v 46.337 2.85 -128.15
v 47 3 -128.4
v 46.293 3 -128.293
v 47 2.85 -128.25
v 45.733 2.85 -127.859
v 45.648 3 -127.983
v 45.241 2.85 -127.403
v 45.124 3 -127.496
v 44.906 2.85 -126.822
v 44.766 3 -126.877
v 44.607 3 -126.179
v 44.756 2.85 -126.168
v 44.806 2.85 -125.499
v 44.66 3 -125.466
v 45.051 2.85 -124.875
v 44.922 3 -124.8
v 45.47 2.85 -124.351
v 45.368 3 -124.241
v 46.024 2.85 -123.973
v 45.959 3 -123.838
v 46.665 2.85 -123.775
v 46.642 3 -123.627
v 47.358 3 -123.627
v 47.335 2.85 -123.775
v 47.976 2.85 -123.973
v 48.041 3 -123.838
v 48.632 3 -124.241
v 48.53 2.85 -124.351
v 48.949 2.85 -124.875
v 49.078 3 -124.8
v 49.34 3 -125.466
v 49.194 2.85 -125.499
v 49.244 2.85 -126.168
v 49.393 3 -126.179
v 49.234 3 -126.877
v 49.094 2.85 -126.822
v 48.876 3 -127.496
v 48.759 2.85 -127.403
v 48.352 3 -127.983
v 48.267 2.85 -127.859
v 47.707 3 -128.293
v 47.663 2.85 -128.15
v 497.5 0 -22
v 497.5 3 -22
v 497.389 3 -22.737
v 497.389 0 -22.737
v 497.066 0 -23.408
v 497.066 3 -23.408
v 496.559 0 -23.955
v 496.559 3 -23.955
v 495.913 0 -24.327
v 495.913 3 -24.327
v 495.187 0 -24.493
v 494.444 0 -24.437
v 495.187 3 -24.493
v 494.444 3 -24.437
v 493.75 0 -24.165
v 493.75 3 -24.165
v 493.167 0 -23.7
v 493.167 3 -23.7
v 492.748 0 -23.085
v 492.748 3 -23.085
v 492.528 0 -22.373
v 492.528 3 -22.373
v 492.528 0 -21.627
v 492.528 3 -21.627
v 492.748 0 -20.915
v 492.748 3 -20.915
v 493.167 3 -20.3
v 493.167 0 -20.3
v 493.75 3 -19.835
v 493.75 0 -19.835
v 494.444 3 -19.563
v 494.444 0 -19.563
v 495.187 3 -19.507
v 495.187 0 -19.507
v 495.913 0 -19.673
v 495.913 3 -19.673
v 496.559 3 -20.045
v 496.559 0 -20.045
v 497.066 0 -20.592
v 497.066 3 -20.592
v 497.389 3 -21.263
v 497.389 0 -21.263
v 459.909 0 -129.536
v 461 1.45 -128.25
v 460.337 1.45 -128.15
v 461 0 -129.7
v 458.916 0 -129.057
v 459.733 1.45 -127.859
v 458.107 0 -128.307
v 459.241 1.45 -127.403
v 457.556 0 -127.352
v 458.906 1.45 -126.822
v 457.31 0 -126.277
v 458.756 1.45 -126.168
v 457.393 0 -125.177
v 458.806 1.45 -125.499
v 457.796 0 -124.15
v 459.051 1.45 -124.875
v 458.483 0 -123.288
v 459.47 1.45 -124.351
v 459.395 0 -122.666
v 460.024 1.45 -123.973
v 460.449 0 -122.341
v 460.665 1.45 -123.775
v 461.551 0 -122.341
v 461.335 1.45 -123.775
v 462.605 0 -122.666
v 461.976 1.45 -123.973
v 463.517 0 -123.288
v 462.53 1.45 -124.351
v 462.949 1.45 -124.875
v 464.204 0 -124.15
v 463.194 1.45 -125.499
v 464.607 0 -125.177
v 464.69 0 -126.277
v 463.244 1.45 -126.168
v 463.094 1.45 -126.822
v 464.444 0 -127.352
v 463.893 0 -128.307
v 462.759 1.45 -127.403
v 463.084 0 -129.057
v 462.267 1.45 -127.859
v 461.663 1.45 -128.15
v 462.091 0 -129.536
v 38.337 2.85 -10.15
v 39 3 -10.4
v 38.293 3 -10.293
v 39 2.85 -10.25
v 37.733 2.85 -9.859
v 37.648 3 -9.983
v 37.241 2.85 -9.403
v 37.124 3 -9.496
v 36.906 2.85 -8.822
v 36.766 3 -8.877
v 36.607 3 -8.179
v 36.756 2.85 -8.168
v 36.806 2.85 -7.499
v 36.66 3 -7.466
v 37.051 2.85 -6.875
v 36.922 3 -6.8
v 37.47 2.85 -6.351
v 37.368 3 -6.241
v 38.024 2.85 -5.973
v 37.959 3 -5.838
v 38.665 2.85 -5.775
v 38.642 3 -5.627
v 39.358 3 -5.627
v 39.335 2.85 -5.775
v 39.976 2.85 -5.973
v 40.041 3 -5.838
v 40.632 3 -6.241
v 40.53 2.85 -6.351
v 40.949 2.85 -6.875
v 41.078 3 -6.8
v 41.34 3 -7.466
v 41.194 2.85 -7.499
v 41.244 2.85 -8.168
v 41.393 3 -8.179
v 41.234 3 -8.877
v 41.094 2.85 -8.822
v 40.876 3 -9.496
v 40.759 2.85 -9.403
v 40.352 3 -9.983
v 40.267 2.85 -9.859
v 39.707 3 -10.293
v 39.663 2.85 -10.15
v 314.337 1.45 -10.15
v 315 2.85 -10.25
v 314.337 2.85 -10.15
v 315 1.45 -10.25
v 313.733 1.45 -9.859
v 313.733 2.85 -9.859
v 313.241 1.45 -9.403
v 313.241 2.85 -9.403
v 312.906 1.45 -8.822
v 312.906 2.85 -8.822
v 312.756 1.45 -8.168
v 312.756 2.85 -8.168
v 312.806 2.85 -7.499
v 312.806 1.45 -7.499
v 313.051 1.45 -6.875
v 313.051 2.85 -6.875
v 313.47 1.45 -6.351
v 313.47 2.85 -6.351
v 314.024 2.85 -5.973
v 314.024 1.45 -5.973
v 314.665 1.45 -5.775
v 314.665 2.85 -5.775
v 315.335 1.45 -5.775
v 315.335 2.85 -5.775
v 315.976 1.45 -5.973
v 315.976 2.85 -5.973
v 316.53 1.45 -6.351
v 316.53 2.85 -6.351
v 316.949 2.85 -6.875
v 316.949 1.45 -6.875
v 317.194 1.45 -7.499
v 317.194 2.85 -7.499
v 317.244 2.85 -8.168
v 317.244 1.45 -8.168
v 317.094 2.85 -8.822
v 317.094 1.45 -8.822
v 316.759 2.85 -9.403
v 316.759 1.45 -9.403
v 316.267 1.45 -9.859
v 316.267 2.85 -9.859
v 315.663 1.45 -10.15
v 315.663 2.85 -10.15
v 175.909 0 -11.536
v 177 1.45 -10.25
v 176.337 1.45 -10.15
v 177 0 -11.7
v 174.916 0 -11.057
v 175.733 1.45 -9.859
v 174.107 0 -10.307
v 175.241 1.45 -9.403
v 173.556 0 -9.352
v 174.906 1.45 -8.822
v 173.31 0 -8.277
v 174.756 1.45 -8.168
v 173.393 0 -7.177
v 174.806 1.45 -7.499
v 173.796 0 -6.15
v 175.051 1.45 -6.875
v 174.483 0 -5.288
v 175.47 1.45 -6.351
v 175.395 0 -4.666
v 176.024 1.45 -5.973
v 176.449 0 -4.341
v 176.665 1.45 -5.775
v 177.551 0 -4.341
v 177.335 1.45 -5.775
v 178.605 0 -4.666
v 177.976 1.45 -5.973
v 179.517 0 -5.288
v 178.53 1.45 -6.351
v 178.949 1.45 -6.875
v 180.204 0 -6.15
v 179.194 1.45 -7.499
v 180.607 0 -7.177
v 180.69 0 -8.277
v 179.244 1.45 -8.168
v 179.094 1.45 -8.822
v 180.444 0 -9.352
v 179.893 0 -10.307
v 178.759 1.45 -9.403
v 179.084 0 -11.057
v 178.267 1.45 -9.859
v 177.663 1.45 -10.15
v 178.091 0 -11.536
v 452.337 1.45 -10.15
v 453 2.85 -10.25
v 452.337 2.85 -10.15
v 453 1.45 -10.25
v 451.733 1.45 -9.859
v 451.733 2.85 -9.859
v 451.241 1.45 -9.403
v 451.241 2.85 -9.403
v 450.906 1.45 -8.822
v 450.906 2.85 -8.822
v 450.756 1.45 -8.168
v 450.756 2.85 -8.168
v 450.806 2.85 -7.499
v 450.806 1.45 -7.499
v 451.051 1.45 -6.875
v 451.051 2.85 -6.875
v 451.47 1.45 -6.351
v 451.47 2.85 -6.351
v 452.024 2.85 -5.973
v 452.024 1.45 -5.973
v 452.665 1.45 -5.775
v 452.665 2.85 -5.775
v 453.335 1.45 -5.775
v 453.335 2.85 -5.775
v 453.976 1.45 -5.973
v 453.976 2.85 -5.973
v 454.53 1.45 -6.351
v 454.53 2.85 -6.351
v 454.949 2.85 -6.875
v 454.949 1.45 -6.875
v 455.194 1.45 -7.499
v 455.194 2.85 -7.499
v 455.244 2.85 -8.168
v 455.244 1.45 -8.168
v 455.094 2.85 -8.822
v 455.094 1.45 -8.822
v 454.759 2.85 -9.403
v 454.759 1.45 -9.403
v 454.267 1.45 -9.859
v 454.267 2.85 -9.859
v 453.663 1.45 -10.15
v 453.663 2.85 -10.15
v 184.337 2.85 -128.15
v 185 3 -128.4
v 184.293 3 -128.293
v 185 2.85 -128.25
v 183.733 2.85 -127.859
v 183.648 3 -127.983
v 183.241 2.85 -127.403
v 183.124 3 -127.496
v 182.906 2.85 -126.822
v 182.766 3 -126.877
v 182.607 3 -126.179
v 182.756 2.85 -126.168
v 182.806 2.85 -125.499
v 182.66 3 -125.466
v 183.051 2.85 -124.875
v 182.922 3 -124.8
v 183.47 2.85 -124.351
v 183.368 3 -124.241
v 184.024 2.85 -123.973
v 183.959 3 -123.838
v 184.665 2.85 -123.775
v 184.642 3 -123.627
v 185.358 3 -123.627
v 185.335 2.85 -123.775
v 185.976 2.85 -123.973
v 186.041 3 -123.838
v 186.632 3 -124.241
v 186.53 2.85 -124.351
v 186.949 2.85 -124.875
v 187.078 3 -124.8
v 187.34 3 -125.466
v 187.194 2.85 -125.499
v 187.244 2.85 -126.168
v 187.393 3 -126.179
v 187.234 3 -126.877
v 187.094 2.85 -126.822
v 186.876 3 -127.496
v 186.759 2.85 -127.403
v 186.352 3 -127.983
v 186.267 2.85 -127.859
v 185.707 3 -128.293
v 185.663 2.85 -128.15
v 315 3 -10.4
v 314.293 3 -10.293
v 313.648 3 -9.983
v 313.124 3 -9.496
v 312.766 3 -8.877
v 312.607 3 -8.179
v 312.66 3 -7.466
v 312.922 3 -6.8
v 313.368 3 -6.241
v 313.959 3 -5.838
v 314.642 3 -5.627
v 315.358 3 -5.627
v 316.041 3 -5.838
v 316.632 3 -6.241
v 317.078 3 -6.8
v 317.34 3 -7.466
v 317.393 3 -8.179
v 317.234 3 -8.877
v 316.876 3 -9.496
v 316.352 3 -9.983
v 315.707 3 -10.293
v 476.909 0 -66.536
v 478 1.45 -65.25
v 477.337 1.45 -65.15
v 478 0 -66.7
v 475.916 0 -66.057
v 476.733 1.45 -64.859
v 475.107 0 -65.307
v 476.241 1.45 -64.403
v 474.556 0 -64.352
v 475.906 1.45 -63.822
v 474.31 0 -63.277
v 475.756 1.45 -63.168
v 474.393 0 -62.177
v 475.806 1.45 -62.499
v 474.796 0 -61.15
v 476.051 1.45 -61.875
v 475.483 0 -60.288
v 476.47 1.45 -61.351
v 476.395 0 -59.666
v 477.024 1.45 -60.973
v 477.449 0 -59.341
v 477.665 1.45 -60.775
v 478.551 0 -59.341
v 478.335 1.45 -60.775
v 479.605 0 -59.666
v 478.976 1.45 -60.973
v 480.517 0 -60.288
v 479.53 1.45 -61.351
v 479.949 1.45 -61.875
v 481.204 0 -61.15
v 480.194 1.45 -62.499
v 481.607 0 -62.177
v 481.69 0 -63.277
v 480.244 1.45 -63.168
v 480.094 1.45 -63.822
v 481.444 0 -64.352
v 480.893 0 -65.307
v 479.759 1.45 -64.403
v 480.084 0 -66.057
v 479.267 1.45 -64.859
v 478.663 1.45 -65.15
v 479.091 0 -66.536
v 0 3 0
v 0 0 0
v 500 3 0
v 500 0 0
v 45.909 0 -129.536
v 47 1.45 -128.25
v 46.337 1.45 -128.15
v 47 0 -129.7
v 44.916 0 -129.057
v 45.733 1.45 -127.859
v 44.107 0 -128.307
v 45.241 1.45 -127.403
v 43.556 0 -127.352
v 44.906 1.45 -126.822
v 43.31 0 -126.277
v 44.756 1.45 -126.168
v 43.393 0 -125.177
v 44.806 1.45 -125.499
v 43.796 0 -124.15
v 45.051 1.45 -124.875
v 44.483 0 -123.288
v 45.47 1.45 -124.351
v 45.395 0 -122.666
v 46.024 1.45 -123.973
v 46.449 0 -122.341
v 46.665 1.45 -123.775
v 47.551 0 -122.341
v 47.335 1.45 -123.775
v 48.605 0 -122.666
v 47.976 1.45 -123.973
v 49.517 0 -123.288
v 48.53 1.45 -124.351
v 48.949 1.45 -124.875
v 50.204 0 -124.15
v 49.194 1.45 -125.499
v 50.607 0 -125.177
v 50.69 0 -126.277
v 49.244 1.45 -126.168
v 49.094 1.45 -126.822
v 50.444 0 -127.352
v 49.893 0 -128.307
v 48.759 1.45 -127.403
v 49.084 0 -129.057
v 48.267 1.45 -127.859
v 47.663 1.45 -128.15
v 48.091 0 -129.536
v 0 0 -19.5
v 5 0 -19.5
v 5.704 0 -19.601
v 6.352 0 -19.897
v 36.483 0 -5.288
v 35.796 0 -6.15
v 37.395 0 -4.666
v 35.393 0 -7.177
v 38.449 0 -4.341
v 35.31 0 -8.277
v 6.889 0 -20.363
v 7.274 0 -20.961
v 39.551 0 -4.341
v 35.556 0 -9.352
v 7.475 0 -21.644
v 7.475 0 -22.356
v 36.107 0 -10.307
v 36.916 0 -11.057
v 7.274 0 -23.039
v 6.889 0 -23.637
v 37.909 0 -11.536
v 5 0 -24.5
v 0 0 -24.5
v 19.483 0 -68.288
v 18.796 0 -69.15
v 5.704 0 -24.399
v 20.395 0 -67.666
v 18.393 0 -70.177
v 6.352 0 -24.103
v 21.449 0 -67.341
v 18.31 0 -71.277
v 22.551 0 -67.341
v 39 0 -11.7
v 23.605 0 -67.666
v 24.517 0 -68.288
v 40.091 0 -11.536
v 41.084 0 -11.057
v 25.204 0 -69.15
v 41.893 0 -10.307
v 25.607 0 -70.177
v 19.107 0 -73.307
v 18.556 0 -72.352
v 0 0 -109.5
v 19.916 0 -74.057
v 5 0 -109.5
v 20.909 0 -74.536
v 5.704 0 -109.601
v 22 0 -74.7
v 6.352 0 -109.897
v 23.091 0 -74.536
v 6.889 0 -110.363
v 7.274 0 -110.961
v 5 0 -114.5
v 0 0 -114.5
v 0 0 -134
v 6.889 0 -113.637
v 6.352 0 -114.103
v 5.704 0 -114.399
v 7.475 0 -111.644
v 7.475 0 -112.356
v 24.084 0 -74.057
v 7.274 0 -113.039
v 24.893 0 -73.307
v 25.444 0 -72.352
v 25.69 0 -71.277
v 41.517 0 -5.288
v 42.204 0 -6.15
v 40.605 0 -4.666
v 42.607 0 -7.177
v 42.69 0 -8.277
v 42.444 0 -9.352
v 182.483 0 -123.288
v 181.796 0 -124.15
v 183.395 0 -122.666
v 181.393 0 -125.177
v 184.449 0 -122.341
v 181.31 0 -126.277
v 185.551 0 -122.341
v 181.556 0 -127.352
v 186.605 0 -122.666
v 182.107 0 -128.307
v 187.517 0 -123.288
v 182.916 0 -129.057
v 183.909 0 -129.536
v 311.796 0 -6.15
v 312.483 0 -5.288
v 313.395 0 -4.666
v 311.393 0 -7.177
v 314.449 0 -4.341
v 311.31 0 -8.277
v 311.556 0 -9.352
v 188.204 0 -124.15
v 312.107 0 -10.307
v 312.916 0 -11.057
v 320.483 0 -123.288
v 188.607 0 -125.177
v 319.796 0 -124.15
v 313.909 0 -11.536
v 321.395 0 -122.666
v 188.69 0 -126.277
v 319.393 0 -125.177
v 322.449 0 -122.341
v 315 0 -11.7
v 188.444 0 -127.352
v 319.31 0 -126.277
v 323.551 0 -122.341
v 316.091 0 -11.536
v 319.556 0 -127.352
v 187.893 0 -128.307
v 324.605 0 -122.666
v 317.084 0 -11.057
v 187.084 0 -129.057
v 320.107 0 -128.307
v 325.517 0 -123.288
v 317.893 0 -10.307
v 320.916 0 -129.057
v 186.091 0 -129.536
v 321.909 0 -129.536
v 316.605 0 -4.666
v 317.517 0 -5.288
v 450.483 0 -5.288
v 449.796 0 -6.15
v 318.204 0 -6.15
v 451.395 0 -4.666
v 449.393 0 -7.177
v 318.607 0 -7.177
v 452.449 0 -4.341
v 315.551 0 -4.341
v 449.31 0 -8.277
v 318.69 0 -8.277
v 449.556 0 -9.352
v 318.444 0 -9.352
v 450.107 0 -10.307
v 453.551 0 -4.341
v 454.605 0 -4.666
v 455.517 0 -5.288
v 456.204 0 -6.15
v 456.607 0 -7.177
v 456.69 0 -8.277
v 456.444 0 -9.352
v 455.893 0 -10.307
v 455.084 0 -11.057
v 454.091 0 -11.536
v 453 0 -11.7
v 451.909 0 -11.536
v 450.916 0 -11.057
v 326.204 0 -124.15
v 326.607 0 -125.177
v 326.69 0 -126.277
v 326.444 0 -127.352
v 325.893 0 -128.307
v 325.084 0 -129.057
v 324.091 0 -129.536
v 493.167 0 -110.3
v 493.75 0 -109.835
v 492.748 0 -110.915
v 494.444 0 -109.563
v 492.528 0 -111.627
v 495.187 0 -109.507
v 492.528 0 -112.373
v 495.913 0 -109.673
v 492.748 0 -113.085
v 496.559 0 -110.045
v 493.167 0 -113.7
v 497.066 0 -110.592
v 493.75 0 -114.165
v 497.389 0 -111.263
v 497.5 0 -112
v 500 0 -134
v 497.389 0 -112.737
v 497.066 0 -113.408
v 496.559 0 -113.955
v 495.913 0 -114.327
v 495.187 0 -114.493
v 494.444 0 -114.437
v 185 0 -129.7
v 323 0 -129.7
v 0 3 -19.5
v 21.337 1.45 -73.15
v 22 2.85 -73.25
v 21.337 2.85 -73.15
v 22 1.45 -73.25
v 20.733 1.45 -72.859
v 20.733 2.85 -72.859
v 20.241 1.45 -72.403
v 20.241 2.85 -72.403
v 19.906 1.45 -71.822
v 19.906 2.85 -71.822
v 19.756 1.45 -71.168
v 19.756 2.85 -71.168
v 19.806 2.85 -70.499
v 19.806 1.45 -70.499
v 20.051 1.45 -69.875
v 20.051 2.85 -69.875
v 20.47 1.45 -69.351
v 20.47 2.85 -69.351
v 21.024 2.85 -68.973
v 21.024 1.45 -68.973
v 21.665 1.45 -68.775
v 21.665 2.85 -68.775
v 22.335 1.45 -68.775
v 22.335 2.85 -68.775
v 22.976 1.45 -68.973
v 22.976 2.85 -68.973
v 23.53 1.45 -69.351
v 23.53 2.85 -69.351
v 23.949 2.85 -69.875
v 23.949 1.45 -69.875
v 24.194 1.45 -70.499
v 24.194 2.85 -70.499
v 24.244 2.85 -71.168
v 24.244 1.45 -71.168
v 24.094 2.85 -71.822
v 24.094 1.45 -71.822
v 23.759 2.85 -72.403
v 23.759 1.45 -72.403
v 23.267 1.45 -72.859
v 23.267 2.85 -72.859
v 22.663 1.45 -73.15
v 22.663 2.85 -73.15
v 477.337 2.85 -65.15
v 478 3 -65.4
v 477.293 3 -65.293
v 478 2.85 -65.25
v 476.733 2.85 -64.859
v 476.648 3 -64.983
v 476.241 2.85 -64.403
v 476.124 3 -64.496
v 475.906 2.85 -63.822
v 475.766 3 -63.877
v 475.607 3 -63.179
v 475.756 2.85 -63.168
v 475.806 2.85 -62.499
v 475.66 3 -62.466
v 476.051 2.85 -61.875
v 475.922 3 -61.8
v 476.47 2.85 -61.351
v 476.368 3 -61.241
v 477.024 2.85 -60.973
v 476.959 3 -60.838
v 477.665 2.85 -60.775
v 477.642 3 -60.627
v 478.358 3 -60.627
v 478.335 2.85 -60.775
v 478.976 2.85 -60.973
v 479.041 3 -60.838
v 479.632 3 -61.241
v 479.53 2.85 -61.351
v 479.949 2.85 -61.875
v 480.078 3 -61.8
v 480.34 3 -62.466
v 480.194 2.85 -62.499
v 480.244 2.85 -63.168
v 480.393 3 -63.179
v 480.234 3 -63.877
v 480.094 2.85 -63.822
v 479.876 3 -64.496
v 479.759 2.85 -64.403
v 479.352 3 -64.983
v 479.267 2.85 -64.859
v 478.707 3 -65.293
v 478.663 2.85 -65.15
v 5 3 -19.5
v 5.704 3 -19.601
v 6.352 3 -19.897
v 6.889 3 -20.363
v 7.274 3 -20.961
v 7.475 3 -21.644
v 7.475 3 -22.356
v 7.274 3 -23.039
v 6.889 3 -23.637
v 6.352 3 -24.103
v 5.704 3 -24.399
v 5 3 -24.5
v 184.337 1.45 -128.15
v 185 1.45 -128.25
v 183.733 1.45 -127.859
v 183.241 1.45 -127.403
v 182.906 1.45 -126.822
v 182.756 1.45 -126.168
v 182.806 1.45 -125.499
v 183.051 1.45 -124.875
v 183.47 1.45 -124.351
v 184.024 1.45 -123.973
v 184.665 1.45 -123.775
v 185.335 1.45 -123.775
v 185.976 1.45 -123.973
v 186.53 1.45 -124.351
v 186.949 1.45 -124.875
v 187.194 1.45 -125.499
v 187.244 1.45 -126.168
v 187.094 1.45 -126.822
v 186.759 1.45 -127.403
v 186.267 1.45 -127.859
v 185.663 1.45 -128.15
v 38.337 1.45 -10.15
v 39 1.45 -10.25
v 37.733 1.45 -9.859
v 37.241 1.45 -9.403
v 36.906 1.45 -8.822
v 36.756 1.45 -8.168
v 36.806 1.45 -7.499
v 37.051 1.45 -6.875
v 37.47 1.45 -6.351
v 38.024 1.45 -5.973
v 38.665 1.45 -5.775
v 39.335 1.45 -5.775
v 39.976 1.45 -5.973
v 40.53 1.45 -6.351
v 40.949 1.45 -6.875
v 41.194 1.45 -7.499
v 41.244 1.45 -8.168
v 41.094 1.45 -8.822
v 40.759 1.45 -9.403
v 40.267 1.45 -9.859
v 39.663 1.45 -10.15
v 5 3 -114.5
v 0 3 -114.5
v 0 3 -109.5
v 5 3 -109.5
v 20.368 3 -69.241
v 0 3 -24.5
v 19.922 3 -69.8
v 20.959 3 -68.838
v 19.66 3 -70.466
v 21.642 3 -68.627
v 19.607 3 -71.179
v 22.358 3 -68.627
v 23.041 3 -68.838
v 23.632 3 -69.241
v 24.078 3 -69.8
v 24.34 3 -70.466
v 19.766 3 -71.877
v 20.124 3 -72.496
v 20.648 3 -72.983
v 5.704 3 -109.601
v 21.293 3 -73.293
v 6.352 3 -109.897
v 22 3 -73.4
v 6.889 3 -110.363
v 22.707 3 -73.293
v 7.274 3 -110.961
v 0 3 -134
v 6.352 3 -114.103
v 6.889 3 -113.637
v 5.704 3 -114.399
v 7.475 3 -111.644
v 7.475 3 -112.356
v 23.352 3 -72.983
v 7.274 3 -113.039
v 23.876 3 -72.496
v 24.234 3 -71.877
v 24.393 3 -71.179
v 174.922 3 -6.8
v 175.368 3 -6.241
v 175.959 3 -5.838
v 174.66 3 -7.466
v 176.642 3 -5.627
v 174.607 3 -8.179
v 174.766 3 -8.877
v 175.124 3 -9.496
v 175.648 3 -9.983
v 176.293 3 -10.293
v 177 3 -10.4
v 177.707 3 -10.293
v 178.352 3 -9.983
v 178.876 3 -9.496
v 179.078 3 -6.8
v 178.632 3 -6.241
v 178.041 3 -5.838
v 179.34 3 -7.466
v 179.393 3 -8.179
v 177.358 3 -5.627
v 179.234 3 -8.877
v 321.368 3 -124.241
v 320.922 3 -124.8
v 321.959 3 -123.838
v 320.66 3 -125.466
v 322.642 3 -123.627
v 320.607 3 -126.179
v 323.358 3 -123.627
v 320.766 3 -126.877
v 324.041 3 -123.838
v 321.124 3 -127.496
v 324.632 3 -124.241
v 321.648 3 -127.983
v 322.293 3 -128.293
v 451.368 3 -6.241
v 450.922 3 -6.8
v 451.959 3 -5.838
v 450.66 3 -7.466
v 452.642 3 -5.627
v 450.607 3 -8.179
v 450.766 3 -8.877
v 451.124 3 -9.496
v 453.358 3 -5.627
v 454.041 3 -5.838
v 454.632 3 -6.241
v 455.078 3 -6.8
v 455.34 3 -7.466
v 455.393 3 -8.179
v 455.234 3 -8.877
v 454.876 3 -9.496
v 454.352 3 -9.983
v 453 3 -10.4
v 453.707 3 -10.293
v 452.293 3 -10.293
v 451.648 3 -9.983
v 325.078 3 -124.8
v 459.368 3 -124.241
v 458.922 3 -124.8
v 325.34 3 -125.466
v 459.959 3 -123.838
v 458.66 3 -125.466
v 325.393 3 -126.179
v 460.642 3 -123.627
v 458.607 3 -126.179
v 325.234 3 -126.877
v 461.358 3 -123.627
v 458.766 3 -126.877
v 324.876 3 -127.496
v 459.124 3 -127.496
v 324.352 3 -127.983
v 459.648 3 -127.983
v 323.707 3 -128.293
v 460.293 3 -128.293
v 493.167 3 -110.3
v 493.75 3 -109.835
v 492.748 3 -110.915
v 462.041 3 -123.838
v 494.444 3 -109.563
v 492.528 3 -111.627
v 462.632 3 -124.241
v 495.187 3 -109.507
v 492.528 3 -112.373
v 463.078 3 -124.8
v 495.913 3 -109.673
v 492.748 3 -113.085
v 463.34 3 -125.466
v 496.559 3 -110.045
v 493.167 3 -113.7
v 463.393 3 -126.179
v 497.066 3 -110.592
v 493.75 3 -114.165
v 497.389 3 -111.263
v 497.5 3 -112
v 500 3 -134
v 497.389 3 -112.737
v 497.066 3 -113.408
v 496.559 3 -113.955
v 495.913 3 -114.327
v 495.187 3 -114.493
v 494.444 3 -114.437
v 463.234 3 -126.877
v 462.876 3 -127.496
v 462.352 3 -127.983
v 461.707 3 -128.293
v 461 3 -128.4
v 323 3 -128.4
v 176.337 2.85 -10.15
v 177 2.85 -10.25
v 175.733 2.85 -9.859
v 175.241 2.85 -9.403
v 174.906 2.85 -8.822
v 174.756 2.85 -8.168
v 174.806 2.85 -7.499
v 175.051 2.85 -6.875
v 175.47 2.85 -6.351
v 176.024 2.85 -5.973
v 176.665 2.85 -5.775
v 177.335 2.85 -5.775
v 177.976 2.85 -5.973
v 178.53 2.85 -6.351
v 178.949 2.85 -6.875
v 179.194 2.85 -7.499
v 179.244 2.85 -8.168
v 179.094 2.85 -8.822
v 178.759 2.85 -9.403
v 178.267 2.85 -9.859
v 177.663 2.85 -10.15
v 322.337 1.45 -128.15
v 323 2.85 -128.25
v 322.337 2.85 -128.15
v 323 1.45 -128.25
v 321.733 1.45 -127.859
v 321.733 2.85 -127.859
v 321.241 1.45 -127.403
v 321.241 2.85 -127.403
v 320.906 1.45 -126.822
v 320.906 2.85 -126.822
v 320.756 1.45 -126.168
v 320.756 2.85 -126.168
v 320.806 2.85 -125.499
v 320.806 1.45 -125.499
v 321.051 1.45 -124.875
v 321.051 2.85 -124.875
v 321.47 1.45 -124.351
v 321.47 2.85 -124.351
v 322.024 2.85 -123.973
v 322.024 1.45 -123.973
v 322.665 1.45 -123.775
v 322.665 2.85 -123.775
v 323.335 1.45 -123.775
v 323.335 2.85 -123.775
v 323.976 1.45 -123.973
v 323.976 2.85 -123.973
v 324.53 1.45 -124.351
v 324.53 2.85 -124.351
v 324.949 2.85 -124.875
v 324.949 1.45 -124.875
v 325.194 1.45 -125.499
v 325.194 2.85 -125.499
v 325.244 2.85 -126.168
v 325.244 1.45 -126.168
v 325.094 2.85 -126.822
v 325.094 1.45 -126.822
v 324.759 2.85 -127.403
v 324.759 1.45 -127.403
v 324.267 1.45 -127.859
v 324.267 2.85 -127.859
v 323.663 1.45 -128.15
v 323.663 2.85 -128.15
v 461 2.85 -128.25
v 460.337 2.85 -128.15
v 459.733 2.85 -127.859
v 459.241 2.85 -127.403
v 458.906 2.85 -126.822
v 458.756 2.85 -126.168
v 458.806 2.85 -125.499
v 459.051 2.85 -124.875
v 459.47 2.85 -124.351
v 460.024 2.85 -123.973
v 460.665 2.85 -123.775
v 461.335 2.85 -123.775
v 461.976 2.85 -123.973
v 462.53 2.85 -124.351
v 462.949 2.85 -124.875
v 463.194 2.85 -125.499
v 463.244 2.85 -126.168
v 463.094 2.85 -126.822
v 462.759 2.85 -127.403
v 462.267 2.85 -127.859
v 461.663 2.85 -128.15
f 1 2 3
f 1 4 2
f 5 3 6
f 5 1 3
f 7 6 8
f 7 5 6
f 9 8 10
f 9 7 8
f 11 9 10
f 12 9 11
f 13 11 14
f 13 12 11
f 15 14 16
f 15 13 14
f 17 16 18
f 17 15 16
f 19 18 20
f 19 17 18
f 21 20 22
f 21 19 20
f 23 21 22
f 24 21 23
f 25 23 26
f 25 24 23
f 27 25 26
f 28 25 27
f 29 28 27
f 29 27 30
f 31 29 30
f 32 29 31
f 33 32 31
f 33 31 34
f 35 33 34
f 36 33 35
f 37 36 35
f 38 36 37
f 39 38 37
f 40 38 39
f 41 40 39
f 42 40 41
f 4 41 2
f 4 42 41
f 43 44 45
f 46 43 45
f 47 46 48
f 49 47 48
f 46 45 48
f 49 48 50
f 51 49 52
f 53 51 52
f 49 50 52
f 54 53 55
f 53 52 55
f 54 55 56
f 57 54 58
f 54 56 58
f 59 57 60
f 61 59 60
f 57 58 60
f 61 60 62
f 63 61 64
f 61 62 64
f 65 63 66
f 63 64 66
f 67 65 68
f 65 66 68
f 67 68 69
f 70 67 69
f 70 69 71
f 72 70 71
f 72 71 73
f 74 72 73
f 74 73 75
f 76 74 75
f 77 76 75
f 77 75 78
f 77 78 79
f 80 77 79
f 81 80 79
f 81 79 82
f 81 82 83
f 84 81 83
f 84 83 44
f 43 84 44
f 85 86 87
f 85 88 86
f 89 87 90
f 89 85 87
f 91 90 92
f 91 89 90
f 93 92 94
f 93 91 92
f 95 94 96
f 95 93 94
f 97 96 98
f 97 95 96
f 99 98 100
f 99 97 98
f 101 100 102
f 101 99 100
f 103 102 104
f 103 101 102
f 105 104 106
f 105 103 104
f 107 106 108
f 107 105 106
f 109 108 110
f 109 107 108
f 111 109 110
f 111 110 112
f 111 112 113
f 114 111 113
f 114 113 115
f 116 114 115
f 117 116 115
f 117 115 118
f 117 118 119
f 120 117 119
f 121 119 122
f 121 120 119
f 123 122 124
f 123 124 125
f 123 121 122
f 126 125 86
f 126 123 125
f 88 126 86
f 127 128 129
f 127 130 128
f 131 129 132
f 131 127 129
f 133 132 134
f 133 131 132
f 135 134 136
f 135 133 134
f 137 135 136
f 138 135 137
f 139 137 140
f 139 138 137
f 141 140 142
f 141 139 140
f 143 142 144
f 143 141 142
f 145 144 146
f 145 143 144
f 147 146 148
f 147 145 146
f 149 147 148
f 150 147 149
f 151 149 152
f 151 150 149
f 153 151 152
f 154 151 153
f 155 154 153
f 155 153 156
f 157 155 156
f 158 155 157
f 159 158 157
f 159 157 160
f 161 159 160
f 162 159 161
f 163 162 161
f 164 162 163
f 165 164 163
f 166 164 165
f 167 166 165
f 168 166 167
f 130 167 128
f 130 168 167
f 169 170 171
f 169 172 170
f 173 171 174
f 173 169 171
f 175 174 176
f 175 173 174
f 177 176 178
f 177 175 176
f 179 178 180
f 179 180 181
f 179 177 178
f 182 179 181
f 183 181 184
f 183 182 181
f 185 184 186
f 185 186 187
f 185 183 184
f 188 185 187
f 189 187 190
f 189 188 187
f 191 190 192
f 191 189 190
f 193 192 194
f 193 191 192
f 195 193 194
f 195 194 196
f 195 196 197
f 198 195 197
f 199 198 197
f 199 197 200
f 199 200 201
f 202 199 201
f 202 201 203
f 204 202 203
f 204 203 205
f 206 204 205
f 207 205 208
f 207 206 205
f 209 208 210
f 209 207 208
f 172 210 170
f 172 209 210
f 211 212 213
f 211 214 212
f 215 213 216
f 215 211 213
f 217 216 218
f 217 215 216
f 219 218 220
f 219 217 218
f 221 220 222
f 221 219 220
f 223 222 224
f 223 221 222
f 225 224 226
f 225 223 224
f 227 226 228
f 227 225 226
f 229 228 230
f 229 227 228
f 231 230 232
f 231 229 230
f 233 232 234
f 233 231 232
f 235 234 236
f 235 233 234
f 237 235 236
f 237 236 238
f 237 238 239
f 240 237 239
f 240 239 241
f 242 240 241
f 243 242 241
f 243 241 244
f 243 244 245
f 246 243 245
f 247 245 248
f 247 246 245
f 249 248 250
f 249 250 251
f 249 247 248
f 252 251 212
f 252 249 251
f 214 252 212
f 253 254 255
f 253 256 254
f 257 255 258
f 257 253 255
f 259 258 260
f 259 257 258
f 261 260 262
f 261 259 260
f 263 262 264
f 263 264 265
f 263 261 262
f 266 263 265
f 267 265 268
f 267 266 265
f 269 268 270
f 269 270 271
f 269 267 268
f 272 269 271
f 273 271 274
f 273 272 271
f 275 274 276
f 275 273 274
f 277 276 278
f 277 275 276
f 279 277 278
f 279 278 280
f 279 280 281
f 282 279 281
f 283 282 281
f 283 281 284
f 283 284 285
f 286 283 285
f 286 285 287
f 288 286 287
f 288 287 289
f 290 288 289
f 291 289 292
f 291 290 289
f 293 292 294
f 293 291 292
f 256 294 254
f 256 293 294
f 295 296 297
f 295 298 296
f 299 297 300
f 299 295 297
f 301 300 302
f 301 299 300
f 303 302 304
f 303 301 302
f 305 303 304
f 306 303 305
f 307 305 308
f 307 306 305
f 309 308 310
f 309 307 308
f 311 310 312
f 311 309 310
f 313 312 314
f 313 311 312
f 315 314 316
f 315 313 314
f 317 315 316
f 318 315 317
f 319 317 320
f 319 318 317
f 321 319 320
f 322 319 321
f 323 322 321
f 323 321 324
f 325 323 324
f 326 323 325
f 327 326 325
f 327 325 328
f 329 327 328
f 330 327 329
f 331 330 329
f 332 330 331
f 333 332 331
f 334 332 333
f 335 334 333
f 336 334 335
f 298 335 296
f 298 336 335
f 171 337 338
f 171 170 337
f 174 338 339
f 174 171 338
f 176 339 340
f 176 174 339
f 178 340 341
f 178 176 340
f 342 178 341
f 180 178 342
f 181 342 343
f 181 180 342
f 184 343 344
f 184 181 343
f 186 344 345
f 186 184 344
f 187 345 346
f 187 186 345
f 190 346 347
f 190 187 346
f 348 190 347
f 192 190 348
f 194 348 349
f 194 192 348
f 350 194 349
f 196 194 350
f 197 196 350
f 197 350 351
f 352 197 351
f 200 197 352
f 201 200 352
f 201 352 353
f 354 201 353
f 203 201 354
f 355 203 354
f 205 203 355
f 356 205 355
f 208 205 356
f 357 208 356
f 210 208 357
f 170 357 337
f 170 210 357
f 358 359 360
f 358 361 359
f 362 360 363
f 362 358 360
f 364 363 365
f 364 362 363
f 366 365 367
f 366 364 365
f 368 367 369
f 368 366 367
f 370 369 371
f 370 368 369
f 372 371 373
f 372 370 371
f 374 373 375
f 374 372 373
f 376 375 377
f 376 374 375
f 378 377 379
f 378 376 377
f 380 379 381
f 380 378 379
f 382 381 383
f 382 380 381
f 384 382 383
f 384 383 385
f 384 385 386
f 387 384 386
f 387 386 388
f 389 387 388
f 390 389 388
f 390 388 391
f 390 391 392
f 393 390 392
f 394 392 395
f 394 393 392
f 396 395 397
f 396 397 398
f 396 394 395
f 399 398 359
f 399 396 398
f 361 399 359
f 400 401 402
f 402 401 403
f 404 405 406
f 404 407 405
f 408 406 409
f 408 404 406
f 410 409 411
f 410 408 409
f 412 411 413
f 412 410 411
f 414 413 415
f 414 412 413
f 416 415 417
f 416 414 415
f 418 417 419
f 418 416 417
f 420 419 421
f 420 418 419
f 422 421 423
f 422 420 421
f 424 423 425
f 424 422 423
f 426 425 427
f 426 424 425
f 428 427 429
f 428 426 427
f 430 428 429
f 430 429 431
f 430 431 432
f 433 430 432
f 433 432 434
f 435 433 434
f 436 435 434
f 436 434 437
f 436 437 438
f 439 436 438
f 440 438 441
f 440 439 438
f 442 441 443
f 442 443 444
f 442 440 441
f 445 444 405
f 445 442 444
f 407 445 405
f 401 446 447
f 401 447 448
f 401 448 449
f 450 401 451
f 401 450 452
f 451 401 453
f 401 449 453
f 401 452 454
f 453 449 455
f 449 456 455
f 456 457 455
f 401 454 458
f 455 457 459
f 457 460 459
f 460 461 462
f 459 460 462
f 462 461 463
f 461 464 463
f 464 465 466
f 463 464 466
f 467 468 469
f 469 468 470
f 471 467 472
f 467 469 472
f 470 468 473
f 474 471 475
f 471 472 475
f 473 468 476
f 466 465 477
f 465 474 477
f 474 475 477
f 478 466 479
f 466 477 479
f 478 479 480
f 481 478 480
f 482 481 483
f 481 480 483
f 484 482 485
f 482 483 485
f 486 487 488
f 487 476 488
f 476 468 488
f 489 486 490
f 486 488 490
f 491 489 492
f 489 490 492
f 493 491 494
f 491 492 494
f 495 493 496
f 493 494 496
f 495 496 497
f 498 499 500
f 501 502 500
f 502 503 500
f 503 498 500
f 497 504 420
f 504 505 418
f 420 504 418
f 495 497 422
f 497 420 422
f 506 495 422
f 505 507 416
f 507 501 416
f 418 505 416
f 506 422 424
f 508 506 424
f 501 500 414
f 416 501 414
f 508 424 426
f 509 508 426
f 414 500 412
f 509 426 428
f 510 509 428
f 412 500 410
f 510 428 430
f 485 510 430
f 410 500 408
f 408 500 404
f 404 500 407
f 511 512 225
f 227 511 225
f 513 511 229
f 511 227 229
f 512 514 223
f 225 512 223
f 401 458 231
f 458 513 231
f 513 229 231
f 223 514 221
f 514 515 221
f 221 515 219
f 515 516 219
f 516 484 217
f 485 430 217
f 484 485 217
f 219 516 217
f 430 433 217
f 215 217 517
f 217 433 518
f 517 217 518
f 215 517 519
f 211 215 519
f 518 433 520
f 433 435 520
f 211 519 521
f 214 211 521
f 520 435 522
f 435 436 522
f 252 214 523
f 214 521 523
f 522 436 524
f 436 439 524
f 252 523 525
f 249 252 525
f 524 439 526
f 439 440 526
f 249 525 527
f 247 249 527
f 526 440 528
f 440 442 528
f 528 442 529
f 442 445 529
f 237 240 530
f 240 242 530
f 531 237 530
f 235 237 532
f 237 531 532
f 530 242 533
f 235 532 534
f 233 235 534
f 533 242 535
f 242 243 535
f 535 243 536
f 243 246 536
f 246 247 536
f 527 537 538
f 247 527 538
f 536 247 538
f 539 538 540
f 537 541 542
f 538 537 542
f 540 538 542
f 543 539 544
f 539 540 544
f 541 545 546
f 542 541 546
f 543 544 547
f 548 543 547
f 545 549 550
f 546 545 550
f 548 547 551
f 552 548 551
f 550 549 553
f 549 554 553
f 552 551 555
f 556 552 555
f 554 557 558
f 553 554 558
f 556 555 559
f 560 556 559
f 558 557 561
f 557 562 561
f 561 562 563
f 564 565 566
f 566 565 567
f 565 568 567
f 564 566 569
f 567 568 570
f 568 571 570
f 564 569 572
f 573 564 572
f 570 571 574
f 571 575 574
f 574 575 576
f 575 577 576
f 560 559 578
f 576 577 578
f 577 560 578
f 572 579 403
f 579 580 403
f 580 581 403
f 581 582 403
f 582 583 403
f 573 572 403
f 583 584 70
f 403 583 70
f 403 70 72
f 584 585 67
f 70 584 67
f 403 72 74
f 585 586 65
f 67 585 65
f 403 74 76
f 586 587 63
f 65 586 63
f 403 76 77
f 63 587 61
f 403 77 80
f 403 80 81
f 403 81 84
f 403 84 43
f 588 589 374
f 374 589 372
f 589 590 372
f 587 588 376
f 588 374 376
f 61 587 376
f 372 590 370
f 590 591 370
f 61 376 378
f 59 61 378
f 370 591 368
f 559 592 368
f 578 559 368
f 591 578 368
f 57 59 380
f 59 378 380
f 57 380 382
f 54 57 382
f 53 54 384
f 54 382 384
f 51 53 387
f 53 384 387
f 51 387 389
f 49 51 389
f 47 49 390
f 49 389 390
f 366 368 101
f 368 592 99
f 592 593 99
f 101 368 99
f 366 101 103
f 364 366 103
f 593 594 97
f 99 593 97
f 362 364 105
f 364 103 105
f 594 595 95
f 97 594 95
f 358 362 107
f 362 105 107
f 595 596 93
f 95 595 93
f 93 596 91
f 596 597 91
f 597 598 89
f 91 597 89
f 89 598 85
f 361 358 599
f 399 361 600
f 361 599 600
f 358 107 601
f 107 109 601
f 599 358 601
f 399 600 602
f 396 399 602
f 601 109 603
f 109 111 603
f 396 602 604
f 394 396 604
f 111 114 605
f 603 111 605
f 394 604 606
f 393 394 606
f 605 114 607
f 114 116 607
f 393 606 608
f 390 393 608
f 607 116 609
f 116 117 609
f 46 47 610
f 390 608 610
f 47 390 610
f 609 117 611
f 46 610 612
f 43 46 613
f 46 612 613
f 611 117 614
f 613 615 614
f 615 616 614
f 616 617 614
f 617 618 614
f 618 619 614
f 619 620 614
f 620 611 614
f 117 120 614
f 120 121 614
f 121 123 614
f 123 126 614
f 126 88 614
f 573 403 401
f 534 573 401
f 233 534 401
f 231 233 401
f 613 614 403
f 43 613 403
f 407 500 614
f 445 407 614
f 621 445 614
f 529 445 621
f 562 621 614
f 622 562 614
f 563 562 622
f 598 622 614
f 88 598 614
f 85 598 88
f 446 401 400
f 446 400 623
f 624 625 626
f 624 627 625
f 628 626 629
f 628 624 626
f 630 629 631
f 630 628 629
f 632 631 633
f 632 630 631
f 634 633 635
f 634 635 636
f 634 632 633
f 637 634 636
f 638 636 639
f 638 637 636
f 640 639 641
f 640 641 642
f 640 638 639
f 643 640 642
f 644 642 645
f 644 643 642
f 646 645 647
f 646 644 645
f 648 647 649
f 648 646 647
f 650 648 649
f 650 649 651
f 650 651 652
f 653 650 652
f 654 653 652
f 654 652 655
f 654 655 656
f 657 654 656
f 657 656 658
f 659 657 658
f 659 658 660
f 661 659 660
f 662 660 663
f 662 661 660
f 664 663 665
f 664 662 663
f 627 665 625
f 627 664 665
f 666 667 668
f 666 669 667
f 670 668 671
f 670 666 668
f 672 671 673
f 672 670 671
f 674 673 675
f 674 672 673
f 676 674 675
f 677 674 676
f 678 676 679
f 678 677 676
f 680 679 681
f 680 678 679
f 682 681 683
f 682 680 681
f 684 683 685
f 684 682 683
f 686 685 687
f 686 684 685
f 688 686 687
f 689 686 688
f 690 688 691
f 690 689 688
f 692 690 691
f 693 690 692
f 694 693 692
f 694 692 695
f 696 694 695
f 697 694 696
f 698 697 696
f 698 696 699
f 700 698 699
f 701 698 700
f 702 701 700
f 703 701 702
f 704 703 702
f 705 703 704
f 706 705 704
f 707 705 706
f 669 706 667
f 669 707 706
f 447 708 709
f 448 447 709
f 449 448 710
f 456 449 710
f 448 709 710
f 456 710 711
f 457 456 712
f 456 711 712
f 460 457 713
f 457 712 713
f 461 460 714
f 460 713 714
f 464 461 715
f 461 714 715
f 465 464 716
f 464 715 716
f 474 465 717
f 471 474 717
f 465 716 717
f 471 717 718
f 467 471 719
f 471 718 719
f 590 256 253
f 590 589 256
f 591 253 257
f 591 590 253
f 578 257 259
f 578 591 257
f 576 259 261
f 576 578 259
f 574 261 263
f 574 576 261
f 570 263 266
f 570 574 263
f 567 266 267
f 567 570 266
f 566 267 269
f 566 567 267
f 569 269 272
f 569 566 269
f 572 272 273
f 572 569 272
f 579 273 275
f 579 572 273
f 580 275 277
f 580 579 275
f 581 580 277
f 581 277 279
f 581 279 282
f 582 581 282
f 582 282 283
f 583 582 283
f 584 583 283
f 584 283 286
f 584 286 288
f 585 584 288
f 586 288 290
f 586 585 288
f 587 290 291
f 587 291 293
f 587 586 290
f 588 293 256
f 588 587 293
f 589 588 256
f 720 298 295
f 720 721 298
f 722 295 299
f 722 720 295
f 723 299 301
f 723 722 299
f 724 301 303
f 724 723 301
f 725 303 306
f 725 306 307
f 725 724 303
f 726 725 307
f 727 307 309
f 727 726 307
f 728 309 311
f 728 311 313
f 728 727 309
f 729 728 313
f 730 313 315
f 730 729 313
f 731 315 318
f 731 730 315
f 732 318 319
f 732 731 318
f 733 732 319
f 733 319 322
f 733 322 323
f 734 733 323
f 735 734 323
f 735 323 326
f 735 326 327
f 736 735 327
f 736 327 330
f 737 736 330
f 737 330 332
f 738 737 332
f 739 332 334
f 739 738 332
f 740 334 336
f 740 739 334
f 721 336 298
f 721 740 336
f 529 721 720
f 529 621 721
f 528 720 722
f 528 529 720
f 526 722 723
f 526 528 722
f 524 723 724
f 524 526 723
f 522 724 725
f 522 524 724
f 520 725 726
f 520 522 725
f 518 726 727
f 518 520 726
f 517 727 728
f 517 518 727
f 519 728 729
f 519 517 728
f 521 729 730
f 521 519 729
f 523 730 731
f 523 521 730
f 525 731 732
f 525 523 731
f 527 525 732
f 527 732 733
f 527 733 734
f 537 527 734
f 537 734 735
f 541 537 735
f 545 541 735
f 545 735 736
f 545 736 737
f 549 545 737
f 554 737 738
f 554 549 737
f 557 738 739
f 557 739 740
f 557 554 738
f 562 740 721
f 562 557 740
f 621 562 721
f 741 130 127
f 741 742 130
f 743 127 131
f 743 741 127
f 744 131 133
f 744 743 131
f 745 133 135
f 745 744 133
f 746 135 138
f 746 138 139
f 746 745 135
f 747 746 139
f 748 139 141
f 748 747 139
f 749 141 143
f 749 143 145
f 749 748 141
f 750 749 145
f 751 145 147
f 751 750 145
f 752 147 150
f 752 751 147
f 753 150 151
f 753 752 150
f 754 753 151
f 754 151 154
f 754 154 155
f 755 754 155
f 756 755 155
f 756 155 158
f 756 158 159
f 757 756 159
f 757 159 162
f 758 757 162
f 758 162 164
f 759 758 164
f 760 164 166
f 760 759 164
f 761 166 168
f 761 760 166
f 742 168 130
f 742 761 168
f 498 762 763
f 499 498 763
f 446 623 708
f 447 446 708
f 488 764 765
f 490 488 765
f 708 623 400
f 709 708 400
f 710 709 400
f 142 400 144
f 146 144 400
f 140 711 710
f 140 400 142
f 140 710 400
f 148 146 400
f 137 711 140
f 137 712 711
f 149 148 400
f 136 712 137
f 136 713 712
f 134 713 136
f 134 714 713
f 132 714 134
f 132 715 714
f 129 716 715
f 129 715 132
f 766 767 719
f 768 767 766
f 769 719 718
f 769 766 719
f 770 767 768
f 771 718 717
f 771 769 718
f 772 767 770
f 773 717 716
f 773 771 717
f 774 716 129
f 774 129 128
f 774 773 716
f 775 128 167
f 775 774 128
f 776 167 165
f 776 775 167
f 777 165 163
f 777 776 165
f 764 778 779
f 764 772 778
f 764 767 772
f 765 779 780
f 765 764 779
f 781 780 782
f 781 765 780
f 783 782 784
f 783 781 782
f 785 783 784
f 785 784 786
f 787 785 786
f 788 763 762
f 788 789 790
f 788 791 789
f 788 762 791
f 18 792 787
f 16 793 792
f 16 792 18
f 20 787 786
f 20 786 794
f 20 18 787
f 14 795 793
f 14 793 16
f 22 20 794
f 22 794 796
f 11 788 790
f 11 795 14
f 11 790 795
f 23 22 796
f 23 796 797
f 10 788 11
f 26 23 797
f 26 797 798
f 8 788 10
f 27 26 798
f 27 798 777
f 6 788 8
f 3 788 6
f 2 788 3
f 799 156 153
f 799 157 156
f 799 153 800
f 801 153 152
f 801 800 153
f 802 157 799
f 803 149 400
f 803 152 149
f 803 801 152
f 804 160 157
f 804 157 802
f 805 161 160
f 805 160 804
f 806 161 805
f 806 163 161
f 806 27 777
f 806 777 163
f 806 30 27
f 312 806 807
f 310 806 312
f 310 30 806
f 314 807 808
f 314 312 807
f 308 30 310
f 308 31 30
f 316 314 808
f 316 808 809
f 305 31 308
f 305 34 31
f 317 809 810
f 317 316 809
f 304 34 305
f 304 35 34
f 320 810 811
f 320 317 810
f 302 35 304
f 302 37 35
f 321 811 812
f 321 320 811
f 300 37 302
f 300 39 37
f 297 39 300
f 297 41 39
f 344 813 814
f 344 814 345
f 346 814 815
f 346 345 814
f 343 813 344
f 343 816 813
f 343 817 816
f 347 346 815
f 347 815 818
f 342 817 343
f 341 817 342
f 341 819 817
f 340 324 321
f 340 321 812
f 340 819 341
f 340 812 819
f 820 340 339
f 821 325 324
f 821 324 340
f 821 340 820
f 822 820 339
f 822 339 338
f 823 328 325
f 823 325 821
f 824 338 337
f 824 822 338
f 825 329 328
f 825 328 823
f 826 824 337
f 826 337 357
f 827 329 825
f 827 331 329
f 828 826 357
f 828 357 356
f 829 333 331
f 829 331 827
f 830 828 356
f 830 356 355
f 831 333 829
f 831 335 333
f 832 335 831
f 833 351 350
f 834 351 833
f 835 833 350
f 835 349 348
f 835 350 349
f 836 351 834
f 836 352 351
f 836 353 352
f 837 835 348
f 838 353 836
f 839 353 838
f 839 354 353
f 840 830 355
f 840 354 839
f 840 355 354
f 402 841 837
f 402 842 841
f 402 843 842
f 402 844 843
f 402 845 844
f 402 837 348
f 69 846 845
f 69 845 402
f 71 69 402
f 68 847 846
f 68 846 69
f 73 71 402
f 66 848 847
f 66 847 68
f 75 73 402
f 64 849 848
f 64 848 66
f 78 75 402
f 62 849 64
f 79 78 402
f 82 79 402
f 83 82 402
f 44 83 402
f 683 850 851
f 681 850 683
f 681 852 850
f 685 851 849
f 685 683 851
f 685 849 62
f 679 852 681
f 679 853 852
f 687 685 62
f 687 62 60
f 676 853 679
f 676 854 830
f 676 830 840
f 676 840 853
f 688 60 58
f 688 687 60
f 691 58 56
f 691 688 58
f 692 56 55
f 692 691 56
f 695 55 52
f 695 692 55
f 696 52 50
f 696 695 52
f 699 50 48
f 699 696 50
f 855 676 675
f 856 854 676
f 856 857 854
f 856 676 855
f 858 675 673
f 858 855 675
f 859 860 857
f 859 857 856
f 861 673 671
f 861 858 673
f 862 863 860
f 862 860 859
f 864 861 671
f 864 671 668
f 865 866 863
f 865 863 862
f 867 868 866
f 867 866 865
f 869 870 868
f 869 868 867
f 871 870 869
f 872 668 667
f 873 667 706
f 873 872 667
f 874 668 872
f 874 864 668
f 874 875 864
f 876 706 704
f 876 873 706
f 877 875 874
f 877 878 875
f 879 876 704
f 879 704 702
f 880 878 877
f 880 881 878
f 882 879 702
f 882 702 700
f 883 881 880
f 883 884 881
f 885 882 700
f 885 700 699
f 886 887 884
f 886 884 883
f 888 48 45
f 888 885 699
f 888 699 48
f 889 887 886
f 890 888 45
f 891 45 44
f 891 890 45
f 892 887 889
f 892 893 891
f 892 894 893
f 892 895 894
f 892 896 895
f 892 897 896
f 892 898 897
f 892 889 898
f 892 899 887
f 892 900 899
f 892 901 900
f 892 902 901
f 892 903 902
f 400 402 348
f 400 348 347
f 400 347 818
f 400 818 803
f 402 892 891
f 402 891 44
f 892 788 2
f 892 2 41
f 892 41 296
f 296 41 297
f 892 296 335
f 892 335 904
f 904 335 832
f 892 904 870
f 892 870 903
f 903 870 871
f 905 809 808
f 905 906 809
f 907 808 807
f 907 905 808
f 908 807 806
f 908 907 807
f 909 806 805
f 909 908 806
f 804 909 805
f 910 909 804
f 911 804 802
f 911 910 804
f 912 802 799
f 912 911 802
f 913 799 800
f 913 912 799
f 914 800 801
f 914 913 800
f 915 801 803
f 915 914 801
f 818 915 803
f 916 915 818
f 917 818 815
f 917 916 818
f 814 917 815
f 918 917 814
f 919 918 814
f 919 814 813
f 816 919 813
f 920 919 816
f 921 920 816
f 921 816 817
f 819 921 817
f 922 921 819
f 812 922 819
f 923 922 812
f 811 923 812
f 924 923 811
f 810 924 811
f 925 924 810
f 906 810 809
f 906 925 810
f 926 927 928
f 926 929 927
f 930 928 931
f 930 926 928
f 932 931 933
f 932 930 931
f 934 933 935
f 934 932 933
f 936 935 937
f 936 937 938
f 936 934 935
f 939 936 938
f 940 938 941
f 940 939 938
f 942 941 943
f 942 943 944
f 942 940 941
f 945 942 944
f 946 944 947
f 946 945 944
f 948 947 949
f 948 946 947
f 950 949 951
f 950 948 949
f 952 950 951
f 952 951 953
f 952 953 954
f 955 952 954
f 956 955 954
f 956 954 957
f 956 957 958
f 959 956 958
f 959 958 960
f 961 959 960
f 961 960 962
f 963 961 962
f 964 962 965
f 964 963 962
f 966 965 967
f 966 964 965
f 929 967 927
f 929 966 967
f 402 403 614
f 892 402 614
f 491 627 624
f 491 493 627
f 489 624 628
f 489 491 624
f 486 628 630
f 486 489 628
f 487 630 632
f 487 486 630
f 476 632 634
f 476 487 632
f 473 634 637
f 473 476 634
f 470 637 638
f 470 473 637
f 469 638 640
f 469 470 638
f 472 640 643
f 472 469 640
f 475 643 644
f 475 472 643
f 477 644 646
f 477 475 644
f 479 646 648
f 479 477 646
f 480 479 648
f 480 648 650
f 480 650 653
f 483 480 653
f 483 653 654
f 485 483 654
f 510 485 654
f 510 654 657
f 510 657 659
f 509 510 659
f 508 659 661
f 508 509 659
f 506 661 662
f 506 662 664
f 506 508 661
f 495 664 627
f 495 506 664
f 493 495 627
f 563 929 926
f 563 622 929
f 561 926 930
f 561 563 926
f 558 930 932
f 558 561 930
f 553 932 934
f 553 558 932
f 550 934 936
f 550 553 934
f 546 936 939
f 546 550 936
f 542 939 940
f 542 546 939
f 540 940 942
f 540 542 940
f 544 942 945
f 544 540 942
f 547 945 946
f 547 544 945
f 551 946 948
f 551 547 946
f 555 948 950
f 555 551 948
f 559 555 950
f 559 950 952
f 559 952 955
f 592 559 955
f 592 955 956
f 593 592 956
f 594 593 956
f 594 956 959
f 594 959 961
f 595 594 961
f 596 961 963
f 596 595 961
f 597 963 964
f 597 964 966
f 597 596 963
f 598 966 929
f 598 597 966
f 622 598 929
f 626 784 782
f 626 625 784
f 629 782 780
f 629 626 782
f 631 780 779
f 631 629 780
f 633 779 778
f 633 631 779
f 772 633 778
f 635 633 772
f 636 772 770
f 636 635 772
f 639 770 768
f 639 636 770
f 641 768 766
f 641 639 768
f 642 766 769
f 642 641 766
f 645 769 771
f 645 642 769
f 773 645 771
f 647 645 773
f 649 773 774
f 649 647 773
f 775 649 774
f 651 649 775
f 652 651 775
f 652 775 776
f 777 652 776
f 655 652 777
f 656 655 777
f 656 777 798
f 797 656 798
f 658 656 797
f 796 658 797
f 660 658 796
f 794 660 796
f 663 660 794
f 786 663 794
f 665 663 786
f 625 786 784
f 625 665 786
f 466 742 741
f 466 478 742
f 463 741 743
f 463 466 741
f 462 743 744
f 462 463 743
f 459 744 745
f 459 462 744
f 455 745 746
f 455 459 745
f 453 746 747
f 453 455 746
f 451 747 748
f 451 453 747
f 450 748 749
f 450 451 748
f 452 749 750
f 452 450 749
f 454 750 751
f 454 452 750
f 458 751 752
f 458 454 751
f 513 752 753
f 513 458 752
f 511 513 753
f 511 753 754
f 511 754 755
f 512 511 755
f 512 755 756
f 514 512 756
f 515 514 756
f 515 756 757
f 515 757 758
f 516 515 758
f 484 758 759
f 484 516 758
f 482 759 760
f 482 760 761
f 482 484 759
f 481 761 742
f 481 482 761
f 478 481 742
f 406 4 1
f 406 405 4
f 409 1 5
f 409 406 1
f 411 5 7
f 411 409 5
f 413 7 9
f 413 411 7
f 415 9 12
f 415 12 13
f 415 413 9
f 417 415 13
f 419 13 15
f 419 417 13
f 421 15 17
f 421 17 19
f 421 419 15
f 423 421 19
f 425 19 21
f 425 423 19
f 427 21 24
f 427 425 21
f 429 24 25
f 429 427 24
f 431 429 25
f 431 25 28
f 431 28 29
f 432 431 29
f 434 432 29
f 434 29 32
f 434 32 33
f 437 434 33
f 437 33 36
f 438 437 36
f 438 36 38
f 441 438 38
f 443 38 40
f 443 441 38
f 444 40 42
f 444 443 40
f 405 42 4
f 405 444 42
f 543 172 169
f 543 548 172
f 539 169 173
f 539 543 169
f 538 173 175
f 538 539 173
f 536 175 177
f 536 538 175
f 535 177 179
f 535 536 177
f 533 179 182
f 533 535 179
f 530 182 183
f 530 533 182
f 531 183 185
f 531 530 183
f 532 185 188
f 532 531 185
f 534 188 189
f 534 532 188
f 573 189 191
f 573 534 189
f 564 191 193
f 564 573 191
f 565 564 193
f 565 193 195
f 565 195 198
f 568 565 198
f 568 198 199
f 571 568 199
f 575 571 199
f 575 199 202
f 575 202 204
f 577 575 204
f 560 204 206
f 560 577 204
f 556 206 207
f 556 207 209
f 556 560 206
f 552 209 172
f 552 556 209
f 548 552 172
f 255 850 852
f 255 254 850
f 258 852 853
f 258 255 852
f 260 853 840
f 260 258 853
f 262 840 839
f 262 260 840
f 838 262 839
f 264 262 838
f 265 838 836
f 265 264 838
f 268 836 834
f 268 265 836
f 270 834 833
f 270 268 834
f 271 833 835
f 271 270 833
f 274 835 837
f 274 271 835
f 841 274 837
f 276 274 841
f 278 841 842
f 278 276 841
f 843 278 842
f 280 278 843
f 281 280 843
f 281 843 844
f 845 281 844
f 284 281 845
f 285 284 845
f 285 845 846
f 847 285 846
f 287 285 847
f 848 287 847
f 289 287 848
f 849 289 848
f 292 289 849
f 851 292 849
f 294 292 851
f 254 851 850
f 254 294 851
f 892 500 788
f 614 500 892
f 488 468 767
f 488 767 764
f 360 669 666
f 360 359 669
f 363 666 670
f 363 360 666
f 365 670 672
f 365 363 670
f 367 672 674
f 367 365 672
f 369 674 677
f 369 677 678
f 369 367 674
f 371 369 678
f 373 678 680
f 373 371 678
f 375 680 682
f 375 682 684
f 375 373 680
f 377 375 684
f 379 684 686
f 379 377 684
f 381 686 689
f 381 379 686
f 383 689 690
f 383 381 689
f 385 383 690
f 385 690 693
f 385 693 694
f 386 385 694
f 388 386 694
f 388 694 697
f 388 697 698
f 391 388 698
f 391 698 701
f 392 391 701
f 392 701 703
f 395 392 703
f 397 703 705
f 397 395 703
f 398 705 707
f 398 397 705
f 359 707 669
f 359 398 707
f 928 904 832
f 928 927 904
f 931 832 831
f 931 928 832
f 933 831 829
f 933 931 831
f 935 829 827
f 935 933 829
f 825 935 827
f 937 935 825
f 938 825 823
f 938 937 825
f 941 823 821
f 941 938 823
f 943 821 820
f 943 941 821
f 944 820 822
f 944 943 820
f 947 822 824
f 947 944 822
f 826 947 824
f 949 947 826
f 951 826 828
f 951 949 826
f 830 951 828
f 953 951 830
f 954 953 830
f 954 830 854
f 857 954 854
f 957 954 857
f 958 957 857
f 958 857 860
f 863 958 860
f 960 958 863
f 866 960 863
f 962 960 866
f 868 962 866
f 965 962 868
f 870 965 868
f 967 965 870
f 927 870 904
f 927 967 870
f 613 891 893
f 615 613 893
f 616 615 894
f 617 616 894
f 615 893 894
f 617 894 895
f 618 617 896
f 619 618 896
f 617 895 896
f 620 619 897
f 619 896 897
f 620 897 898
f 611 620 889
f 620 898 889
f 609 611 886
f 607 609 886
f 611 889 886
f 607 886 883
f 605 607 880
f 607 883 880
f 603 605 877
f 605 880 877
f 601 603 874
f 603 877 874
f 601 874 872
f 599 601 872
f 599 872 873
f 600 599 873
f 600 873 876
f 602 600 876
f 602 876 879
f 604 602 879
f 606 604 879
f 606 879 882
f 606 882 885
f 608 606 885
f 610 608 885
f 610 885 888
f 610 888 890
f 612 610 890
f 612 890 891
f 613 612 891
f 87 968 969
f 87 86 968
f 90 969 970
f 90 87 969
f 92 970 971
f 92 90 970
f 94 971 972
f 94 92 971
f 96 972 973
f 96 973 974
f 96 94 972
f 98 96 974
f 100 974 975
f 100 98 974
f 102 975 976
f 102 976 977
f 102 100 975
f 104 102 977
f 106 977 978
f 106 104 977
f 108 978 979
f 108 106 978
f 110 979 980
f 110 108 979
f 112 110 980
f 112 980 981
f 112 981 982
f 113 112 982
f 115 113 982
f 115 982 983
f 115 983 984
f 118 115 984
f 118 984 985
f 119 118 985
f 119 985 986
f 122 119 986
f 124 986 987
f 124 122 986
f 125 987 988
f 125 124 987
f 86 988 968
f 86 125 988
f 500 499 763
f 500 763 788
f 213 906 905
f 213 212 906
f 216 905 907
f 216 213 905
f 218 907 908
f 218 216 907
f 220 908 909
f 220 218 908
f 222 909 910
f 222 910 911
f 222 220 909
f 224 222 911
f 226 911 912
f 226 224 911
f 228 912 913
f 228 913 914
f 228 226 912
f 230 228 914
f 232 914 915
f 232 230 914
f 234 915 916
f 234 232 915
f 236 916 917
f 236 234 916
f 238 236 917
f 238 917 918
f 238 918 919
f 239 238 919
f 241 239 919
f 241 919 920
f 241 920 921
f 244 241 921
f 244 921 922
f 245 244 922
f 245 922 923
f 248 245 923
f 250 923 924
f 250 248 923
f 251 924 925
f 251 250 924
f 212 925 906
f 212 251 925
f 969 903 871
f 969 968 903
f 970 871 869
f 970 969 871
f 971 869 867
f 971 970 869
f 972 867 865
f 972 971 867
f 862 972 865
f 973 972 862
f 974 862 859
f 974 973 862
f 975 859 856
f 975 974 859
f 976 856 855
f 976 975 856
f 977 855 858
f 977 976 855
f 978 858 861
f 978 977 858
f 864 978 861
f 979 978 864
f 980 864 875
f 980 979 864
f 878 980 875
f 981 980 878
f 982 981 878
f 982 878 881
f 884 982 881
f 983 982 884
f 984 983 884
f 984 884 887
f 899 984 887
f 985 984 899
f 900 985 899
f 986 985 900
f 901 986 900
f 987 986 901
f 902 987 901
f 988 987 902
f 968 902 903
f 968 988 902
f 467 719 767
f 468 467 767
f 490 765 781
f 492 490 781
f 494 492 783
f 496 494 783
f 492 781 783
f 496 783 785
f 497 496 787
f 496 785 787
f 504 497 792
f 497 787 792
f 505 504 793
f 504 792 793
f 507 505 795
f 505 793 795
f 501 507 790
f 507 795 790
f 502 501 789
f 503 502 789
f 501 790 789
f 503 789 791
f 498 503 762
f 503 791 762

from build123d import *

# Parameters (mm, degrees)
SKETCH_2_W                  = 500
SKETCH_2_H                  = 134
EXTRUDE_1_DEPTH             = 3
SKETCH_3_R                  = 2.5
CUT_EXTRUDE_1_DEPTH         = 4
HOLE_WIZARD_M41_AT_2_COUNT  = 2
HOLE_WIZARD_M41_AT_2_PITCH  = 138
HOLE_WIZARD_M41_AT_3_COUNT  = 2
HOLE_WIZARD_M41_AT_3_PITCH  = 167.314075917
HOLE_WIZARD_M41_AT_4_COUNT  = 2
HOLE_WIZARD_M41_AT_4_PITCH  = 175.567650779
HOLE_WIZARD_M41_AT_5_COUNT  = 2
HOLE_WIZARD_M41_AT_5_PITCH  = 118.270875536
HOLE_WIZARD_M41_AT_6_COUNT  = 2
HOLE_WIZARD_M41_AT_6_PITCH  = 187.723200484
HOLE_WIZARD_M41_AT_7_COUNT  = 2
HOLE_WIZARD_M41_AT_7_PITCH  = 307.538615462
HOLE_WIZARD_M41_AT_8_COUNT  = 2
HOLE_WIZARD_M41_AT_8_PITCH  = 305.983659694
HOLE_WIZARD_M41_AT_9_COUNT  = 2
HOLE_WIZARD_M41_AT_9_PITCH  = 276
HOLE_WIZARD_M41_AT_10_COUNT = 2
HOLE_WIZARD_M41_AT_10_PITCH = 138


with BuildPart() as part:
    # Эскиз2 → Бобышка-Вытянуть1 (new body)
    with BuildSketch(Plane(origin=(0, 0, 0), x_dir=(1, 0, 0), z_dir=(0, 1, 0))):
        with Locations((250, 67)):
            Rectangle(SKETCH_2_W, SKETCH_2_H)
    extrude(amount=EXTRUDE_1_DEPTH)

    # Эскиз3 → Вырез-Вытянуть1 (cut, through all)
    with BuildSketch(Plane(origin=(0, 3, 0), x_dir=(1, 0, 0), z_dir=(0, 1, 0))):
        with BuildLine():
            ThreePointArc((5, 109.5), (7.5, 112), (5, 114.5))
            Line((5, 114.5), (0, 114.5))
            Line((0, 114.5), (0, 109.5))
            Line((0, 109.5), (5, 109.5))
        make_face()
        with BuildLine():
            Line((5, 24.5), (0, 24.5))
            Line((0, 24.5), (0, 19.5))
            Line((0, 19.5), (5, 19.5))
            ThreePointArc((5, 19.5), (7.5, 22), (5, 24.5))
        make_face()
        with Locations((495, 22)):
            Circle(SKETCH_3_R)
        with Locations((495, 112)):
            Circle(SKETCH_3_R)
    extrude(amount=-CUT_EXTRUDE_1_DEPTH, mode=Mode.SUBTRACT)

    # Эскиз4 → Зенковка для винта с потайной головкой M41 (revolve, cut)
    with BuildSketch(Plane(origin=(177, 0, -8), x_dir=(0, 0, -1), z_dir=(1, 0, 0))):
        Polygon((0, 0), (0, 3), (2.4, 3), (2.25, 2.85), (2.25, 1.45), (3.7, 0), align=None)
    hole_wizard_m41 = revolve(axis=Axis((177, -6.35, -8), (0, 1, 0)), mode=Mode.SUBTRACT)

    # Зенковка для винта с потайной головкой M41 at 2: Зенковка для винта с потайной головкой M41 ×2
    with Locations(*[(-i * HOLE_WIZARD_M41_AT_2_PITCH, 0, 0) for i in range(1, HOLE_WIZARD_M41_AT_2_COUNT)]):
        add(hole_wizard_m41, mode=Mode.SUBTRACT)

    # Зенковка для винта с потайной головкой M41 at 3: Зенковка для винта с потайной головкой M41 ×2
    with Locations(*[Vector(-0.926401435, 0, -0.376537357) * (i * HOLE_WIZARD_M41_AT_3_PITCH) for i in range(1, HOLE_WIZARD_M41_AT_3_COUNT)]):
        add(hole_wizard_m41, mode=Mode.SUBTRACT)

    # Зенковка для винта с потайной головкой M41 at 4: Зенковка для винта с потайной головкой M41 ×2
    with Locations(*[Vector(-0.740455314, 0, -0.672105593) * (i * HOLE_WIZARD_M41_AT_4_PITCH) for i in range(1, HOLE_WIZARD_M41_AT_4_COUNT)]):
        add(hole_wizard_m41, mode=Mode.SUBTRACT)

    # Зенковка для винта с потайной головкой M41 at 5: Зенковка для винта с потайной головкой M41 ×2
    with Locations(*[Vector(0.067641336, 0, -0.997709702) * (i * HOLE_WIZARD_M41_AT_5_PITCH) for i in range(1, HOLE_WIZARD_M41_AT_5_COUNT)]):
        add(hole_wizard_m41, mode=Mode.SUBTRACT)

    # Зенковка для винта с потайной головкой M41 at 6: Зенковка для винта с потайной головкой M41 ×2
    with Locations(*[Vector(0.777740842, 0, -0.628585064) * (i * HOLE_WIZARD_M41_AT_6_PITCH) for i in range(1, HOLE_WIZARD_M41_AT_6_COUNT)]):
        add(hole_wizard_m41, mode=Mode.SUBTRACT)

    # Зенковка для винта с потайной головкой M41 at 7: Зенковка для винта с потайной головкой M41 ×2
    with Locations(*[Vector(0.923461269, 0, -0.383691654) * (i * HOLE_WIZARD_M41_AT_7_PITCH) for i in range(1, HOLE_WIZARD_M41_AT_7_COUNT)]):
        add(hole_wizard_m41, mode=Mode.SUBTRACT)

    # Зенковка для винта с потайной головкой M41 at 8: Зенковка для винта с потайной головкой M41 ×2
    with Locations(*[Vector(0.983712661, 0, -0.179748161) * (i * HOLE_WIZARD_M41_AT_8_PITCH) for i in range(1, HOLE_WIZARD_M41_AT_8_COUNT)]):
        add(hole_wizard_m41, mode=Mode.SUBTRACT)

    # Зенковка для винта с потайной головкой M41 at 9: Зенковка для винта с потайной головкой M41 ×2
    with Locations(*[(i * HOLE_WIZARD_M41_AT_9_PITCH, 0, 0) for i in range(1, HOLE_WIZARD_M41_AT_9_COUNT)]):
        add(hole_wizard_m41, mode=Mode.SUBTRACT)

    # Зенковка для винта с потайной головкой M41 at 10: Зенковка для винта с потайной головкой M41 ×2
    with Locations(*[(i * HOLE_WIZARD_M41_AT_10_PITCH, 0, 0) for i in range(1, HOLE_WIZARD_M41_AT_10_COUNT)]):
        add(hole_wizard_m41, mode=Mode.SUBTRACT)


solid = part.part
